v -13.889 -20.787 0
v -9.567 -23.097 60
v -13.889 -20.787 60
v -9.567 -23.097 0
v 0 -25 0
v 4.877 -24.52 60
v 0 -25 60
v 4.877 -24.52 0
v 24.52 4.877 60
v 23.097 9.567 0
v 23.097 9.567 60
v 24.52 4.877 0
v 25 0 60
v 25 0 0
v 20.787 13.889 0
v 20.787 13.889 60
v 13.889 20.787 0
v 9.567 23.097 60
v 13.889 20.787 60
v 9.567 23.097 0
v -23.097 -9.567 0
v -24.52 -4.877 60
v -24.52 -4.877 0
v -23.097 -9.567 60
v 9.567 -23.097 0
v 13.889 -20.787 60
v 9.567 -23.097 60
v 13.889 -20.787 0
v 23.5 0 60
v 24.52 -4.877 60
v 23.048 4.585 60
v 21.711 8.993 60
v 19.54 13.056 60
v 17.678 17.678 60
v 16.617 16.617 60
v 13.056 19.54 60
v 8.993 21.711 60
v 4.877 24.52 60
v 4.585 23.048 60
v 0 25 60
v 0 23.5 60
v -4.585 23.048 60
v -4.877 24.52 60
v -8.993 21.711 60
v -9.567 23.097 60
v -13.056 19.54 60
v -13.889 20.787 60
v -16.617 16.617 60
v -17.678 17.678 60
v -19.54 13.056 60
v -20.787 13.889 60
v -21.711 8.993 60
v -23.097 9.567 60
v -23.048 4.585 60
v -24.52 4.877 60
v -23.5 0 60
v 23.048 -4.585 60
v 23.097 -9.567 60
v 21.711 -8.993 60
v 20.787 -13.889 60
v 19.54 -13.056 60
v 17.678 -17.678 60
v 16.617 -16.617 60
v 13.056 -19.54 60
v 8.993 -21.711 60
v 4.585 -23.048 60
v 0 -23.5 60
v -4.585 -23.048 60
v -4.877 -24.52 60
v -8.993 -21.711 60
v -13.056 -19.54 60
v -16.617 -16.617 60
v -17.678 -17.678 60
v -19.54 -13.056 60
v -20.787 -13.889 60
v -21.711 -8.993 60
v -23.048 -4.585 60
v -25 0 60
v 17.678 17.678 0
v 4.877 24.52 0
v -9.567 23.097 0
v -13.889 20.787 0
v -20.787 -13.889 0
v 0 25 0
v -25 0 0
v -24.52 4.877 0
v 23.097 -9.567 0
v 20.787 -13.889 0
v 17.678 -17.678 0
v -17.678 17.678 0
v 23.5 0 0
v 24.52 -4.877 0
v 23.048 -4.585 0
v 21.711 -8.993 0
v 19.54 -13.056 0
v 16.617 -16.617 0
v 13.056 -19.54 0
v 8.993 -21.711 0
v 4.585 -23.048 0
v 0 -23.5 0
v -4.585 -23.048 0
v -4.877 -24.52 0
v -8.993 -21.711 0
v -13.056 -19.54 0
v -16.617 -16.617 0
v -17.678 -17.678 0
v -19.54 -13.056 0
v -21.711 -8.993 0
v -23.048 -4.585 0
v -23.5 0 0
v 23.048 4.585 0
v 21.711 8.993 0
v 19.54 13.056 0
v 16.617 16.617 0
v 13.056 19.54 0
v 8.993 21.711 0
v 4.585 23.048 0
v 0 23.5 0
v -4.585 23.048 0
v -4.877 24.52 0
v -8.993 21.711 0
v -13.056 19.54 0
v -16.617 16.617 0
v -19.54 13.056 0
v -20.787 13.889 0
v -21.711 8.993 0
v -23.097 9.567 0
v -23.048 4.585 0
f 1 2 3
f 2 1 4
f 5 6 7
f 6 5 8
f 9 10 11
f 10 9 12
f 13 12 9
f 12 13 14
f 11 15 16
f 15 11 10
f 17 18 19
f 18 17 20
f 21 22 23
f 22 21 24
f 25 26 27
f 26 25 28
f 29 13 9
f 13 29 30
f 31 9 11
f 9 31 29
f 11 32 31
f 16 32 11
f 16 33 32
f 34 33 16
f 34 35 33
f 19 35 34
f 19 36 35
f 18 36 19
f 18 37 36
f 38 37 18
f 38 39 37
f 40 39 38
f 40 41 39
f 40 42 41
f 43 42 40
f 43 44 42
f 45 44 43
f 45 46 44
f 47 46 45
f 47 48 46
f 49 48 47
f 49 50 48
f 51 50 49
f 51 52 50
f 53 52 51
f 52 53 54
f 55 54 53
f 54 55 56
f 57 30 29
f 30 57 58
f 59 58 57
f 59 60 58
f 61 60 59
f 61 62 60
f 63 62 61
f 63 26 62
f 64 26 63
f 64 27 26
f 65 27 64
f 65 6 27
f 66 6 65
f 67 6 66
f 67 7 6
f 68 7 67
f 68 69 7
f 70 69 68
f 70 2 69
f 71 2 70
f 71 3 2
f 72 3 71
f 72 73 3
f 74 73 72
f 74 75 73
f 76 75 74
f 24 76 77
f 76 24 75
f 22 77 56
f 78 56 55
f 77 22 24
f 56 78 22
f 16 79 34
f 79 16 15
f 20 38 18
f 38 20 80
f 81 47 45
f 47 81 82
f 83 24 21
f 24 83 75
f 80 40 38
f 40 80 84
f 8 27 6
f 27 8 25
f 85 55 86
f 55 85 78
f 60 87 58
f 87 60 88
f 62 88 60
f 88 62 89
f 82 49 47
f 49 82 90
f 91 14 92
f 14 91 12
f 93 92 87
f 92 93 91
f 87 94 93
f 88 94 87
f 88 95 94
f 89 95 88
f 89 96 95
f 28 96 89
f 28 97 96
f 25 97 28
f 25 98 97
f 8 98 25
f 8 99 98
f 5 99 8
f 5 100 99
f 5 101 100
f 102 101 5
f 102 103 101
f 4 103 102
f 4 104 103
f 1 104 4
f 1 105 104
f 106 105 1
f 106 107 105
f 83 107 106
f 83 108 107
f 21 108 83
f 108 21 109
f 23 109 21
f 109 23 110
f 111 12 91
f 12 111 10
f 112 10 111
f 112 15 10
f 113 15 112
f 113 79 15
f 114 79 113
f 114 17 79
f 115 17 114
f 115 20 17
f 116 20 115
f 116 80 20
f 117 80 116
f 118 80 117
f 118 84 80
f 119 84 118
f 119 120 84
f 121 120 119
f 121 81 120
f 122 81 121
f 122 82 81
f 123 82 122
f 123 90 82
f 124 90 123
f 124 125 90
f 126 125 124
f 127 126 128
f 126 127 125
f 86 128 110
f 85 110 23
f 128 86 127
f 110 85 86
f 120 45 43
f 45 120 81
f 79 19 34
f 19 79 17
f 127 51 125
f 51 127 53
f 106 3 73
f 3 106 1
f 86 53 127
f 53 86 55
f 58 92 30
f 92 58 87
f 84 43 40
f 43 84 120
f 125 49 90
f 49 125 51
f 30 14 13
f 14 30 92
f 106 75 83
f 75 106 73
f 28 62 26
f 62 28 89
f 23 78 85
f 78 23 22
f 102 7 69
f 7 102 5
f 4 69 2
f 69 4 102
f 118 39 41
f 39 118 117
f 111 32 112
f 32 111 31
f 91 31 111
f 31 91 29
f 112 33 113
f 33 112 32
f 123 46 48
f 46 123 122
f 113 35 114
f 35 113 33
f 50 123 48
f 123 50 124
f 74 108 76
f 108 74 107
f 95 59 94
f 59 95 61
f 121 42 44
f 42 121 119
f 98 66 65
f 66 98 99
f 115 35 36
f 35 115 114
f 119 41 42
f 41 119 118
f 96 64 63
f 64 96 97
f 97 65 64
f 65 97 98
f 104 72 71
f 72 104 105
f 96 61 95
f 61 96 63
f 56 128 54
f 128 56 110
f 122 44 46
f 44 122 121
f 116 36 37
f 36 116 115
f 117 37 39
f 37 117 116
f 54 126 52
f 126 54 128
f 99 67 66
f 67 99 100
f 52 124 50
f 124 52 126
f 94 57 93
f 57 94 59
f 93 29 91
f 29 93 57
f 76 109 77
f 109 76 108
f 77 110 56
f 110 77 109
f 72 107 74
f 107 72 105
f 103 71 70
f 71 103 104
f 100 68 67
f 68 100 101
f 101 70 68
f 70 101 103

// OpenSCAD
$fn = 32;

// ----------------------------------------------------------------------
// Thin tube: 1.5 mm wall
// ----------------------------------------------------------------------

// --- parameters (mm) ---
tube_od = 50;             // outer diameter
tube_h = 60;              // height, Z
wall = 1.5;               // wall thickness

difference() {
  cylinder(h = tube_h, d = tube_od);
  translate([0, 0, -1]) cylinder(h = tube_h + 2, d = tube_od - 2 * wall);
}
